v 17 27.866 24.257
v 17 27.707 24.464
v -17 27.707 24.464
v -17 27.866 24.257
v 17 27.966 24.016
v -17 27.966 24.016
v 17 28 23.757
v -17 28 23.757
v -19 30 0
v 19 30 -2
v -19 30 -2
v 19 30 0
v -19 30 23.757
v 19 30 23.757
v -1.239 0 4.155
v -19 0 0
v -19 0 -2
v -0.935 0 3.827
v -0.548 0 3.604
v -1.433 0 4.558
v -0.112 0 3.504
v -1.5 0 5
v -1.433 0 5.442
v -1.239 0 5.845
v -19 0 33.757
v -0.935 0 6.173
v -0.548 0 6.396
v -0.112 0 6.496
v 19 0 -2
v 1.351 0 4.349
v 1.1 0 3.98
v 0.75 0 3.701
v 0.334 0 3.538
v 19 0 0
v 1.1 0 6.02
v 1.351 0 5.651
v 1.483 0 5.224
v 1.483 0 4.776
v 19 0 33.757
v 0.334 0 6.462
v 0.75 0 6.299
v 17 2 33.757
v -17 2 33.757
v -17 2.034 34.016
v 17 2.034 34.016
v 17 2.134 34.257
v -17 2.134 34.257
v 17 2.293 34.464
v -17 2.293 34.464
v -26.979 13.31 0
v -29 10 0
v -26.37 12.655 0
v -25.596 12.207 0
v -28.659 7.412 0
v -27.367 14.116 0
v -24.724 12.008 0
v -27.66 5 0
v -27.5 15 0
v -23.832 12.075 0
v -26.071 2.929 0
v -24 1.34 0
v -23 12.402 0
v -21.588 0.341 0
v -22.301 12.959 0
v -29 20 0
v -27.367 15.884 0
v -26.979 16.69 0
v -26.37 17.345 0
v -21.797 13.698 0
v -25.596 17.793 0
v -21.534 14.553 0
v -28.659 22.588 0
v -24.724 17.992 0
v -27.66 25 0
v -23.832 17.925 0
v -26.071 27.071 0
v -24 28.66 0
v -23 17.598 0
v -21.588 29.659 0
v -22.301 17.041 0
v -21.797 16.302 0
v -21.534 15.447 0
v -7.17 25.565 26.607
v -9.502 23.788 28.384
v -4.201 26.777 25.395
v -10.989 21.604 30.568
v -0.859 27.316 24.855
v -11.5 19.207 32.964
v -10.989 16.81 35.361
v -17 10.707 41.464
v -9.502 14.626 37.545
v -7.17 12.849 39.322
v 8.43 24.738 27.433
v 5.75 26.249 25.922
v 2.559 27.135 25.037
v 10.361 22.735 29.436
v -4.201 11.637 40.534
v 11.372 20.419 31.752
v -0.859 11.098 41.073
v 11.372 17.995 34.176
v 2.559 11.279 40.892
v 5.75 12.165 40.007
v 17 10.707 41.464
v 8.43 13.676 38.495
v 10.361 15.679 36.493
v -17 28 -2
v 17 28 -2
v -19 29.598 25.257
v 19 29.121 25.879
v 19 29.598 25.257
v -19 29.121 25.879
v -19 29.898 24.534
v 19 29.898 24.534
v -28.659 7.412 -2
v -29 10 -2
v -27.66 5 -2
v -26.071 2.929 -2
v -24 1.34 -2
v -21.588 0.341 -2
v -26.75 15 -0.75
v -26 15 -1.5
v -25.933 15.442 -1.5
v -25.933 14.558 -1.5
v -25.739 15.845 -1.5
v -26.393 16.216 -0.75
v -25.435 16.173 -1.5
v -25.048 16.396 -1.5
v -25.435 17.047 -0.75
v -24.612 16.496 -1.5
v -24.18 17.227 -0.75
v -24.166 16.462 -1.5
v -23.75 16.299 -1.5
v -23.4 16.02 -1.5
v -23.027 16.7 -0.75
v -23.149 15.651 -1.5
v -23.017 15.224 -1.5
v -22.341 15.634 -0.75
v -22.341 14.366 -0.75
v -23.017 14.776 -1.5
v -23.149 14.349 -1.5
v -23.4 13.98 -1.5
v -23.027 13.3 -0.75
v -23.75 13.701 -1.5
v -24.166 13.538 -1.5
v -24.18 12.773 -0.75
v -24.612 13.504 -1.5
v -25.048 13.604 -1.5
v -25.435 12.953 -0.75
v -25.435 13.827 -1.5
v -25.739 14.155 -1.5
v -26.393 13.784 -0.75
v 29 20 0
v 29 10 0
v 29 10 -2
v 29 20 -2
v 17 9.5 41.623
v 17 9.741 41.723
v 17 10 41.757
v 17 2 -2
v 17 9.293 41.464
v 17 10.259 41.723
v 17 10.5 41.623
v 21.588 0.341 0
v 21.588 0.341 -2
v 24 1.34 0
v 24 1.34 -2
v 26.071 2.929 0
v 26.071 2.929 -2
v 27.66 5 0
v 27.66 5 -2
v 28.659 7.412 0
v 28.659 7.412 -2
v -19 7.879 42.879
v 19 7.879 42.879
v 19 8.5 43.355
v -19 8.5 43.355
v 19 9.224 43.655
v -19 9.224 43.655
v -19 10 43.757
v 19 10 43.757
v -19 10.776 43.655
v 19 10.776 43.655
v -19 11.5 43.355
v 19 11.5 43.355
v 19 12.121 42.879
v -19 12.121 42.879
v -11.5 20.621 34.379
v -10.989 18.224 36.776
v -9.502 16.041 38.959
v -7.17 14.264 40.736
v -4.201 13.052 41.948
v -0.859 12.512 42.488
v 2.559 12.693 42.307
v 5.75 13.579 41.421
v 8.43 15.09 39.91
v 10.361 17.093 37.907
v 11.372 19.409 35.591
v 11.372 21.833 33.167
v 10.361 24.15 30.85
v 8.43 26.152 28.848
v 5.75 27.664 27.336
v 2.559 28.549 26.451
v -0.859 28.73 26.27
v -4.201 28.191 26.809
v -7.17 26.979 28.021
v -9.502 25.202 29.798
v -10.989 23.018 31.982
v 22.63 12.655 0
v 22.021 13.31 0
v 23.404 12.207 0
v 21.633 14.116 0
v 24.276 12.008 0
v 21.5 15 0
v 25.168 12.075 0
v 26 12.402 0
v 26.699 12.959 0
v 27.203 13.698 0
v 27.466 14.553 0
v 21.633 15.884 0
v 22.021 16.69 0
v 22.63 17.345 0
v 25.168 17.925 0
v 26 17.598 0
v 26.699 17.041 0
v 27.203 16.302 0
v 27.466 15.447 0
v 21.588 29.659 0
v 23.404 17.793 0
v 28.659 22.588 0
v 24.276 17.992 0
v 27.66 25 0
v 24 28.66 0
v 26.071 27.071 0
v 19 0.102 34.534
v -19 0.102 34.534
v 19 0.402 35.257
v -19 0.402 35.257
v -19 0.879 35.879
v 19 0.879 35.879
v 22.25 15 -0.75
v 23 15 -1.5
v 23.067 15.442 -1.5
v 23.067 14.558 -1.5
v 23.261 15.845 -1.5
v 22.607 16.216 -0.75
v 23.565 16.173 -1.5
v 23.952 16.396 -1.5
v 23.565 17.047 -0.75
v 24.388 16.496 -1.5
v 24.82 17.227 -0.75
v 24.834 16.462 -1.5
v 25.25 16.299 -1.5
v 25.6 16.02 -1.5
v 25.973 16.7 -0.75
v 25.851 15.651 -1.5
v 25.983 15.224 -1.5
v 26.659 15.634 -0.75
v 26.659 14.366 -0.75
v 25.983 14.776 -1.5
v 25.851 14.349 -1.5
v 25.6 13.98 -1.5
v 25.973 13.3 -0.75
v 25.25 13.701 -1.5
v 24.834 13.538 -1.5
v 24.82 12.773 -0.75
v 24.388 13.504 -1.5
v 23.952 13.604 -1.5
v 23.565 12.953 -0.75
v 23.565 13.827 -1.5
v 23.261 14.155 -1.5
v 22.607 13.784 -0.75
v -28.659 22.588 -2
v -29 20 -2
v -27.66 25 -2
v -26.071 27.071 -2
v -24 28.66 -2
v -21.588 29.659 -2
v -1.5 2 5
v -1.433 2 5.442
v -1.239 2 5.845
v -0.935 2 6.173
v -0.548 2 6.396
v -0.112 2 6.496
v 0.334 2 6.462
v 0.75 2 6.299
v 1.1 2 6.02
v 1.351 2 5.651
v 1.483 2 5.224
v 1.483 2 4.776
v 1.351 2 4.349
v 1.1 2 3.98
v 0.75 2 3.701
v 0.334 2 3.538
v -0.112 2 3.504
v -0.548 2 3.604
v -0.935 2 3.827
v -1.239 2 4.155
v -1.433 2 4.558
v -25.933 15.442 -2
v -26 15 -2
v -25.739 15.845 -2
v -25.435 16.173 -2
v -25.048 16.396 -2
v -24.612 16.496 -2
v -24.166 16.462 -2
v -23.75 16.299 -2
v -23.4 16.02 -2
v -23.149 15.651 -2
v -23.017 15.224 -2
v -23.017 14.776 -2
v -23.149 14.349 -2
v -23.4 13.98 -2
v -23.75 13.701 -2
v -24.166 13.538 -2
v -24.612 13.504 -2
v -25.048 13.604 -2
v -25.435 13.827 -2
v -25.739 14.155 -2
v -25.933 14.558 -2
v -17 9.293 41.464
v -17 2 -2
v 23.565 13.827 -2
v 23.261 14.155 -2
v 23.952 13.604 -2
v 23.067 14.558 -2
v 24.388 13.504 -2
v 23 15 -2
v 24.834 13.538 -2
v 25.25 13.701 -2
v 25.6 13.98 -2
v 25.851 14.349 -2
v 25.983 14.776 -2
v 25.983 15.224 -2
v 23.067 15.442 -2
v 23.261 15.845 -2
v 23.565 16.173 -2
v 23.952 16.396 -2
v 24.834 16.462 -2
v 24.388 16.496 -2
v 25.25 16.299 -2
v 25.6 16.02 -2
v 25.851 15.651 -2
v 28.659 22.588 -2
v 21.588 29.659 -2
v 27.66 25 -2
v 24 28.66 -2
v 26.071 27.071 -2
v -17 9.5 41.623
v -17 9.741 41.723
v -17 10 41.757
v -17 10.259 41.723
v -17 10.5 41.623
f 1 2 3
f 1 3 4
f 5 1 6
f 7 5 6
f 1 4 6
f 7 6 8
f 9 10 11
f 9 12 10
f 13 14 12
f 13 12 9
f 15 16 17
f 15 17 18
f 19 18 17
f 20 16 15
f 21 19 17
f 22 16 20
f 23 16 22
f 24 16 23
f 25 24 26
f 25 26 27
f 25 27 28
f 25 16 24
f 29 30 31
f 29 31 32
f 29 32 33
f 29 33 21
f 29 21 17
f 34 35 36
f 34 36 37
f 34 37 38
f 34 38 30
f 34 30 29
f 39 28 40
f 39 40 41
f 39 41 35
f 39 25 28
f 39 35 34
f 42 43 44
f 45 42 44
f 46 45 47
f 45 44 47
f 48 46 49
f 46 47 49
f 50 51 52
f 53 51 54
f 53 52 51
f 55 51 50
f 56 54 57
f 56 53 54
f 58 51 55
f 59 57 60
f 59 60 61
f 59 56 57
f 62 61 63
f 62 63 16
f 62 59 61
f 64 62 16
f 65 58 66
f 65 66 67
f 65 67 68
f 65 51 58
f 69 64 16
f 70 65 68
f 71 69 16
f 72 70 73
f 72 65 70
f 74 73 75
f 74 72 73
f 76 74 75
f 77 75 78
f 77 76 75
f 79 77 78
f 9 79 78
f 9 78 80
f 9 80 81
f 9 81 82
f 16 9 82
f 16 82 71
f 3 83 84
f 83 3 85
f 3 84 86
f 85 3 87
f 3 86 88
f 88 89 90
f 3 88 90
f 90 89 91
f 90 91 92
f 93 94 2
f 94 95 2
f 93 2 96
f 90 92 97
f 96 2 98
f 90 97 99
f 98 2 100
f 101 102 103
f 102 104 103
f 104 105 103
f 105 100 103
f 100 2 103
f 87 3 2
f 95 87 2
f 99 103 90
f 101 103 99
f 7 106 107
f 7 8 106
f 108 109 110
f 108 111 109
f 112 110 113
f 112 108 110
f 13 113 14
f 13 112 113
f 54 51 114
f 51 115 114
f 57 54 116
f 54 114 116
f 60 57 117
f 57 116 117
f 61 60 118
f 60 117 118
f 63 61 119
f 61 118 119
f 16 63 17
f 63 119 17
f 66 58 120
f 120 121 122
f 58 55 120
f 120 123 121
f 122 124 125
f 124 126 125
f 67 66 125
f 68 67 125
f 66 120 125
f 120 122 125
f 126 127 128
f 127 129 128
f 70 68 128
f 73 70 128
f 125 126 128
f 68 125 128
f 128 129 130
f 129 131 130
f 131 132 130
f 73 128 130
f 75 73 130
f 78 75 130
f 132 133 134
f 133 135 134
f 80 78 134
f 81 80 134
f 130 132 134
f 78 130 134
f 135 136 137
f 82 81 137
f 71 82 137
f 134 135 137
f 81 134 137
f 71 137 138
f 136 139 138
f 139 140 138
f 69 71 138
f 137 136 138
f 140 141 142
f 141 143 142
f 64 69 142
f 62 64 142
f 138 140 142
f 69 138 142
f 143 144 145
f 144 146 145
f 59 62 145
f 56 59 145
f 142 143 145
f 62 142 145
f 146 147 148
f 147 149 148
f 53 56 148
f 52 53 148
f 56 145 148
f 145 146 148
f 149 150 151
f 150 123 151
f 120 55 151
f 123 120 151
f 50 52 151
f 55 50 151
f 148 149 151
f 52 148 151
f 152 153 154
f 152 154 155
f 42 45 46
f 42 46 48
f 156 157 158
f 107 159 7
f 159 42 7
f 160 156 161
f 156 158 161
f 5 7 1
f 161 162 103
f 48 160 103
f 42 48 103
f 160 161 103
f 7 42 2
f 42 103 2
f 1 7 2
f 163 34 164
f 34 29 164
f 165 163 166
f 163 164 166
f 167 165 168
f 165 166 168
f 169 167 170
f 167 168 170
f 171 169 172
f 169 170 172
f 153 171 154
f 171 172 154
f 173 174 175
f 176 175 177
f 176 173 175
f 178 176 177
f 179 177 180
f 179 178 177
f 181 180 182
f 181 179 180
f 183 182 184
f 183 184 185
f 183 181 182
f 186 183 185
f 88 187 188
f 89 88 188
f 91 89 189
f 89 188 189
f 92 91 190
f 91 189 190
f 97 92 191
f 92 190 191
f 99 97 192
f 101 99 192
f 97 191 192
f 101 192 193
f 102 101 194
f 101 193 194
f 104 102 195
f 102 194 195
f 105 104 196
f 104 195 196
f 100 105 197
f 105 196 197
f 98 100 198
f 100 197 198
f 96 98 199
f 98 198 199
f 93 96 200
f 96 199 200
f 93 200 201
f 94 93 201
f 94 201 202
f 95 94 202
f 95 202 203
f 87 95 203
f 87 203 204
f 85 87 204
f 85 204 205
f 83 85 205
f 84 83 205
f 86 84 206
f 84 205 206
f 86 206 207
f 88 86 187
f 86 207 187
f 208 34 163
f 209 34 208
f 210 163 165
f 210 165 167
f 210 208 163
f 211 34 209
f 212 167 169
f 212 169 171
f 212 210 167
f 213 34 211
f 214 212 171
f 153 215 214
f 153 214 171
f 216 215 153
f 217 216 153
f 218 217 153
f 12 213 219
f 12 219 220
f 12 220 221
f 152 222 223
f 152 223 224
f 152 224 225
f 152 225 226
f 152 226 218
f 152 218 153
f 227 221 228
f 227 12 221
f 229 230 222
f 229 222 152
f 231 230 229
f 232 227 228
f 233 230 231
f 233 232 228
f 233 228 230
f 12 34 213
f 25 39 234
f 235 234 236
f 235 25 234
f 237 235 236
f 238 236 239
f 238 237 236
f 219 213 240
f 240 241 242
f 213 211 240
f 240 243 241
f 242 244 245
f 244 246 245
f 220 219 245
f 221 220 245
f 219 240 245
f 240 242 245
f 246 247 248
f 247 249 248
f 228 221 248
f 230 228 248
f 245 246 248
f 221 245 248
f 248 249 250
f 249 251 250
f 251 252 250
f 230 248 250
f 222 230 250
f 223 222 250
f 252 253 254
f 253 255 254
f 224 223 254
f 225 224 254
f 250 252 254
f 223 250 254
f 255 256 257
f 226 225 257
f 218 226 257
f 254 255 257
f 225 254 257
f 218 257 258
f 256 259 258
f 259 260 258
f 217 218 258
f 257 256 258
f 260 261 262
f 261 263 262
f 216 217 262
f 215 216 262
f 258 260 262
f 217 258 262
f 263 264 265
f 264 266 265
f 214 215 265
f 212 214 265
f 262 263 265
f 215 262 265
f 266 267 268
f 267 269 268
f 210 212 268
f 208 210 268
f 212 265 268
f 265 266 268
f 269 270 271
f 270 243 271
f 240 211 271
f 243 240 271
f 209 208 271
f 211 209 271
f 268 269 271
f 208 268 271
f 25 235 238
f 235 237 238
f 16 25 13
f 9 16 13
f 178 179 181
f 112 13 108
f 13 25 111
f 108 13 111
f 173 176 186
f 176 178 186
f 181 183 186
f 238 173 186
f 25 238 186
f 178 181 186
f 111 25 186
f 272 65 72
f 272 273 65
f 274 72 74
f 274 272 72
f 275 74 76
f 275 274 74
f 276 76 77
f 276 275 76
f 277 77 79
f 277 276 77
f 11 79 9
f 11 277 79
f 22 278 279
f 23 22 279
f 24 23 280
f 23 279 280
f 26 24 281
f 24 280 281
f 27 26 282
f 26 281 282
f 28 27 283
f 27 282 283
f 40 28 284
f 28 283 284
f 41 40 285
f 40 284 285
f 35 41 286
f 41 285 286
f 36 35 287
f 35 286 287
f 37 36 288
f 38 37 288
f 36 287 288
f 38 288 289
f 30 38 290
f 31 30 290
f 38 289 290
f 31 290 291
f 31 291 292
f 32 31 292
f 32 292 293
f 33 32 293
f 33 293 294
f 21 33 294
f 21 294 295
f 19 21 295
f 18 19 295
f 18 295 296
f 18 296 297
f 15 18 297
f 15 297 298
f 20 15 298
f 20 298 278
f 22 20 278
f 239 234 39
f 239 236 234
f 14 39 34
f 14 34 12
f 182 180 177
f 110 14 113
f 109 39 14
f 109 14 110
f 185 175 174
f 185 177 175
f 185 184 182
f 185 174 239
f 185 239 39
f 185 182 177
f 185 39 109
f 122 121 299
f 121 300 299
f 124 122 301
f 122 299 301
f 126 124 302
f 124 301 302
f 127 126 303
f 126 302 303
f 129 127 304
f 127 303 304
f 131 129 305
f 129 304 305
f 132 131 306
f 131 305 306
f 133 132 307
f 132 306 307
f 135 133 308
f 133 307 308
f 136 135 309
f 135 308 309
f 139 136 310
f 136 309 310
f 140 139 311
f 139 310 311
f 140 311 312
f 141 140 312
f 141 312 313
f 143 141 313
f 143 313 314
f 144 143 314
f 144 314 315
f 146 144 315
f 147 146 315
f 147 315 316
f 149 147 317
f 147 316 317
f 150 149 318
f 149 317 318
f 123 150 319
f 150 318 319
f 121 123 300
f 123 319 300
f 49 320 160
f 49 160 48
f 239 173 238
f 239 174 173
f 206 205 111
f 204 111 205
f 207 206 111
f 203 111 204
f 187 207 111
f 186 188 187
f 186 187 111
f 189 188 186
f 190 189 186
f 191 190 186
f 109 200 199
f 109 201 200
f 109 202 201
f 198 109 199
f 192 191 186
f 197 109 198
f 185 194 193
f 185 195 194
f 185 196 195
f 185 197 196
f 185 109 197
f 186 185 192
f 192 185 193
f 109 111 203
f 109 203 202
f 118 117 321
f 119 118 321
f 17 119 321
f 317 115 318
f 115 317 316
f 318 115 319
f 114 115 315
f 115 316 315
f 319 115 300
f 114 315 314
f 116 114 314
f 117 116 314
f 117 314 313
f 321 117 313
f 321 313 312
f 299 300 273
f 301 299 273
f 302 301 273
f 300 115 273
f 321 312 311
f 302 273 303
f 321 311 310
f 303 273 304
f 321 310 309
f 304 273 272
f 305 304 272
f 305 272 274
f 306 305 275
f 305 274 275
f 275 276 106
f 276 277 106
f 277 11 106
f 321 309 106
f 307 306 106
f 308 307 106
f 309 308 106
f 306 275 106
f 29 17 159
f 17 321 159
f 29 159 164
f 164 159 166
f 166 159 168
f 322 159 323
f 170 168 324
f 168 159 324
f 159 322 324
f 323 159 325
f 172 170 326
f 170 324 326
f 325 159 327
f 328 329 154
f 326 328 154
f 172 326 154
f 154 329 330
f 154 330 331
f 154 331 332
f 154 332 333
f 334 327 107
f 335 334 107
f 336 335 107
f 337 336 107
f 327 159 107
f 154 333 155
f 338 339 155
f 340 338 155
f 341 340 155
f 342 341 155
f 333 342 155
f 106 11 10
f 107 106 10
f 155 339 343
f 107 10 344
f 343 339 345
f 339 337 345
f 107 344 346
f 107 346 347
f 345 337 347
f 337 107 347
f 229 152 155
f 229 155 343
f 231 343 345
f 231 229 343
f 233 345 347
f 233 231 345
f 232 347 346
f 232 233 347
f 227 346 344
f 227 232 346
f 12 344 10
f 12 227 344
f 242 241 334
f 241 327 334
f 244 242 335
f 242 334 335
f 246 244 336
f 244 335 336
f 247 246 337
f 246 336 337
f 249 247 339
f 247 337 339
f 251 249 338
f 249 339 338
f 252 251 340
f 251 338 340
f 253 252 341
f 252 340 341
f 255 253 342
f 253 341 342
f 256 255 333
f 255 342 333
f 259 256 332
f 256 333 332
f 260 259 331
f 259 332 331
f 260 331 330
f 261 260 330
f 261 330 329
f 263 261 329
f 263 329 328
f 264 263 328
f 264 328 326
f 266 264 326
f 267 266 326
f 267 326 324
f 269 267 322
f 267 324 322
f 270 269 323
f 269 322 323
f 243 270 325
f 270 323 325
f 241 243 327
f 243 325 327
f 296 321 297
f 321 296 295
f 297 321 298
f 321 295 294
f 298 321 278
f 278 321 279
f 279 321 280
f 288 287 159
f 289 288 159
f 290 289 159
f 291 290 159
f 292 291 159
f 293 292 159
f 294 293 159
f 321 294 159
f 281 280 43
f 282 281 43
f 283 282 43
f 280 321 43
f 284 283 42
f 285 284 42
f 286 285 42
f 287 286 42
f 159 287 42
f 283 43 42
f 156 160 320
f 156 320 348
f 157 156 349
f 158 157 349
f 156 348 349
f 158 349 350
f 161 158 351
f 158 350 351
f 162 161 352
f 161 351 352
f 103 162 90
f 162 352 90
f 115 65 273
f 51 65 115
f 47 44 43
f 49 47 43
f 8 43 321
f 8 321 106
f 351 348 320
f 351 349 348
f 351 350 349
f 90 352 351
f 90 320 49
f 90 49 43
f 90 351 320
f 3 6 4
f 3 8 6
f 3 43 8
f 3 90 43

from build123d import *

# Parameters (mm, degrees)
F1_DEPTH       = 19
F1_DEPTH_BACK  = 19
F2_R           = 3
F3_T           = -2
F4_W           = 34
F4_H           = 26
F5_DEPTH       = 2
F6_R           = 11.5
F7_DEPTH       = 2
F9_D           = 3
F9_CSINK_D     = 6
F9_CSINK_ANGLE = 90
F11_D          = 3
F11_DEPTH      = 12
F12_R          = 10
F13_R          = 10
F14_R          = 10


with BuildPart() as f1:
    # F0 (on Right) → F1 (new body, two sides)
    with BuildSketch(Plane.YZ) as f1_sk:
        Polygon((0, 35), (0, 0), (30, 0), (30, 25), (10, 45), align=None)
    extrude(amount=F1_DEPTH)
    extrude(f1_sk.sketch, amount=-F1_DEPTH_BACK)

    # F2
    f2_edges = [f1.edges().sort_by_distance(p)[0] for p in [
        (0, 10, 45),
        (0, 0, 35),
        (0, 30, 25),
    ]]
    fillet(f2_edges, radius=F2_R)

    # F3
    f3_openings = [f1.faces().sort_by_distance(p)[0] for p in [
        (0, 15, 0),
    ]]
    offset(amount=F3_T, openings=f3_openings)

    # F4 (on Top) → F5 (join)
    with BuildSketch(Plane.XY):
        with BuildLine():
            Line((-29, 0), (29, 0))
            Line((29, 0), (29, 20))
            ThreePointArc((29, 20), (26.071068, 27.071068), (19, 30))
            Line((19, 30), (-17, 30))
            Line((-17, 30), (-29, 30))
            Line((-29, 30), (-29, 0))
        make_face()
        with Locations((0, 15)):
            Rectangle(F4_W, F4_H, mode=Mode.SUBTRACT)
    extrude(amount=-F5_DEPTH)

    # F6 (on face) → F7 (cut, through all)
    with BuildSketch(Plane(origin=(0, 27.5, 27.5), x_dir=(-1, 0, 0), z_dir=(0, 0.707107, 0.707107))):
        with Locations((0, 9.727922)):
            Circle(F6_R)
    extrude(amount=-F7_DEPTH, mode=Mode.SUBTRACT)

    # F9 (through all)
    with Locations(Plane.XY):
        with Locations((24.5, 15), (-24.5, 15)):
            CounterSinkHole(F9_D / 2, F9_CSINK_D / 2, counter_sink_angle=F9_CSINK_ANGLE)

    # F11
    with Locations(Plane.XZ):
        with Locations((0, 5)):
            Hole(F11_D / 2, depth=F11_DEPTH)

    # F12
    f12_edges = [f1.edges().sort_by_distance(p)[0] for p in [
        (29, 0, -1),
    ]]
    fillet(f12_edges, radius=F12_R)

    # F13
    f13_edges = [f1.edges().sort_by_distance(p)[0] for p in [
        (-29, 30, -1),
    ]]
    fillet(f13_edges, radius=F13_R)

    # F14
    f14_edges = [f1.edges().sort_by_distance(p)[0] for p in [
        (-29, 0, -1),
    ]]
    fillet(f14_edges, radius=F14_R)


solid = f1.part
